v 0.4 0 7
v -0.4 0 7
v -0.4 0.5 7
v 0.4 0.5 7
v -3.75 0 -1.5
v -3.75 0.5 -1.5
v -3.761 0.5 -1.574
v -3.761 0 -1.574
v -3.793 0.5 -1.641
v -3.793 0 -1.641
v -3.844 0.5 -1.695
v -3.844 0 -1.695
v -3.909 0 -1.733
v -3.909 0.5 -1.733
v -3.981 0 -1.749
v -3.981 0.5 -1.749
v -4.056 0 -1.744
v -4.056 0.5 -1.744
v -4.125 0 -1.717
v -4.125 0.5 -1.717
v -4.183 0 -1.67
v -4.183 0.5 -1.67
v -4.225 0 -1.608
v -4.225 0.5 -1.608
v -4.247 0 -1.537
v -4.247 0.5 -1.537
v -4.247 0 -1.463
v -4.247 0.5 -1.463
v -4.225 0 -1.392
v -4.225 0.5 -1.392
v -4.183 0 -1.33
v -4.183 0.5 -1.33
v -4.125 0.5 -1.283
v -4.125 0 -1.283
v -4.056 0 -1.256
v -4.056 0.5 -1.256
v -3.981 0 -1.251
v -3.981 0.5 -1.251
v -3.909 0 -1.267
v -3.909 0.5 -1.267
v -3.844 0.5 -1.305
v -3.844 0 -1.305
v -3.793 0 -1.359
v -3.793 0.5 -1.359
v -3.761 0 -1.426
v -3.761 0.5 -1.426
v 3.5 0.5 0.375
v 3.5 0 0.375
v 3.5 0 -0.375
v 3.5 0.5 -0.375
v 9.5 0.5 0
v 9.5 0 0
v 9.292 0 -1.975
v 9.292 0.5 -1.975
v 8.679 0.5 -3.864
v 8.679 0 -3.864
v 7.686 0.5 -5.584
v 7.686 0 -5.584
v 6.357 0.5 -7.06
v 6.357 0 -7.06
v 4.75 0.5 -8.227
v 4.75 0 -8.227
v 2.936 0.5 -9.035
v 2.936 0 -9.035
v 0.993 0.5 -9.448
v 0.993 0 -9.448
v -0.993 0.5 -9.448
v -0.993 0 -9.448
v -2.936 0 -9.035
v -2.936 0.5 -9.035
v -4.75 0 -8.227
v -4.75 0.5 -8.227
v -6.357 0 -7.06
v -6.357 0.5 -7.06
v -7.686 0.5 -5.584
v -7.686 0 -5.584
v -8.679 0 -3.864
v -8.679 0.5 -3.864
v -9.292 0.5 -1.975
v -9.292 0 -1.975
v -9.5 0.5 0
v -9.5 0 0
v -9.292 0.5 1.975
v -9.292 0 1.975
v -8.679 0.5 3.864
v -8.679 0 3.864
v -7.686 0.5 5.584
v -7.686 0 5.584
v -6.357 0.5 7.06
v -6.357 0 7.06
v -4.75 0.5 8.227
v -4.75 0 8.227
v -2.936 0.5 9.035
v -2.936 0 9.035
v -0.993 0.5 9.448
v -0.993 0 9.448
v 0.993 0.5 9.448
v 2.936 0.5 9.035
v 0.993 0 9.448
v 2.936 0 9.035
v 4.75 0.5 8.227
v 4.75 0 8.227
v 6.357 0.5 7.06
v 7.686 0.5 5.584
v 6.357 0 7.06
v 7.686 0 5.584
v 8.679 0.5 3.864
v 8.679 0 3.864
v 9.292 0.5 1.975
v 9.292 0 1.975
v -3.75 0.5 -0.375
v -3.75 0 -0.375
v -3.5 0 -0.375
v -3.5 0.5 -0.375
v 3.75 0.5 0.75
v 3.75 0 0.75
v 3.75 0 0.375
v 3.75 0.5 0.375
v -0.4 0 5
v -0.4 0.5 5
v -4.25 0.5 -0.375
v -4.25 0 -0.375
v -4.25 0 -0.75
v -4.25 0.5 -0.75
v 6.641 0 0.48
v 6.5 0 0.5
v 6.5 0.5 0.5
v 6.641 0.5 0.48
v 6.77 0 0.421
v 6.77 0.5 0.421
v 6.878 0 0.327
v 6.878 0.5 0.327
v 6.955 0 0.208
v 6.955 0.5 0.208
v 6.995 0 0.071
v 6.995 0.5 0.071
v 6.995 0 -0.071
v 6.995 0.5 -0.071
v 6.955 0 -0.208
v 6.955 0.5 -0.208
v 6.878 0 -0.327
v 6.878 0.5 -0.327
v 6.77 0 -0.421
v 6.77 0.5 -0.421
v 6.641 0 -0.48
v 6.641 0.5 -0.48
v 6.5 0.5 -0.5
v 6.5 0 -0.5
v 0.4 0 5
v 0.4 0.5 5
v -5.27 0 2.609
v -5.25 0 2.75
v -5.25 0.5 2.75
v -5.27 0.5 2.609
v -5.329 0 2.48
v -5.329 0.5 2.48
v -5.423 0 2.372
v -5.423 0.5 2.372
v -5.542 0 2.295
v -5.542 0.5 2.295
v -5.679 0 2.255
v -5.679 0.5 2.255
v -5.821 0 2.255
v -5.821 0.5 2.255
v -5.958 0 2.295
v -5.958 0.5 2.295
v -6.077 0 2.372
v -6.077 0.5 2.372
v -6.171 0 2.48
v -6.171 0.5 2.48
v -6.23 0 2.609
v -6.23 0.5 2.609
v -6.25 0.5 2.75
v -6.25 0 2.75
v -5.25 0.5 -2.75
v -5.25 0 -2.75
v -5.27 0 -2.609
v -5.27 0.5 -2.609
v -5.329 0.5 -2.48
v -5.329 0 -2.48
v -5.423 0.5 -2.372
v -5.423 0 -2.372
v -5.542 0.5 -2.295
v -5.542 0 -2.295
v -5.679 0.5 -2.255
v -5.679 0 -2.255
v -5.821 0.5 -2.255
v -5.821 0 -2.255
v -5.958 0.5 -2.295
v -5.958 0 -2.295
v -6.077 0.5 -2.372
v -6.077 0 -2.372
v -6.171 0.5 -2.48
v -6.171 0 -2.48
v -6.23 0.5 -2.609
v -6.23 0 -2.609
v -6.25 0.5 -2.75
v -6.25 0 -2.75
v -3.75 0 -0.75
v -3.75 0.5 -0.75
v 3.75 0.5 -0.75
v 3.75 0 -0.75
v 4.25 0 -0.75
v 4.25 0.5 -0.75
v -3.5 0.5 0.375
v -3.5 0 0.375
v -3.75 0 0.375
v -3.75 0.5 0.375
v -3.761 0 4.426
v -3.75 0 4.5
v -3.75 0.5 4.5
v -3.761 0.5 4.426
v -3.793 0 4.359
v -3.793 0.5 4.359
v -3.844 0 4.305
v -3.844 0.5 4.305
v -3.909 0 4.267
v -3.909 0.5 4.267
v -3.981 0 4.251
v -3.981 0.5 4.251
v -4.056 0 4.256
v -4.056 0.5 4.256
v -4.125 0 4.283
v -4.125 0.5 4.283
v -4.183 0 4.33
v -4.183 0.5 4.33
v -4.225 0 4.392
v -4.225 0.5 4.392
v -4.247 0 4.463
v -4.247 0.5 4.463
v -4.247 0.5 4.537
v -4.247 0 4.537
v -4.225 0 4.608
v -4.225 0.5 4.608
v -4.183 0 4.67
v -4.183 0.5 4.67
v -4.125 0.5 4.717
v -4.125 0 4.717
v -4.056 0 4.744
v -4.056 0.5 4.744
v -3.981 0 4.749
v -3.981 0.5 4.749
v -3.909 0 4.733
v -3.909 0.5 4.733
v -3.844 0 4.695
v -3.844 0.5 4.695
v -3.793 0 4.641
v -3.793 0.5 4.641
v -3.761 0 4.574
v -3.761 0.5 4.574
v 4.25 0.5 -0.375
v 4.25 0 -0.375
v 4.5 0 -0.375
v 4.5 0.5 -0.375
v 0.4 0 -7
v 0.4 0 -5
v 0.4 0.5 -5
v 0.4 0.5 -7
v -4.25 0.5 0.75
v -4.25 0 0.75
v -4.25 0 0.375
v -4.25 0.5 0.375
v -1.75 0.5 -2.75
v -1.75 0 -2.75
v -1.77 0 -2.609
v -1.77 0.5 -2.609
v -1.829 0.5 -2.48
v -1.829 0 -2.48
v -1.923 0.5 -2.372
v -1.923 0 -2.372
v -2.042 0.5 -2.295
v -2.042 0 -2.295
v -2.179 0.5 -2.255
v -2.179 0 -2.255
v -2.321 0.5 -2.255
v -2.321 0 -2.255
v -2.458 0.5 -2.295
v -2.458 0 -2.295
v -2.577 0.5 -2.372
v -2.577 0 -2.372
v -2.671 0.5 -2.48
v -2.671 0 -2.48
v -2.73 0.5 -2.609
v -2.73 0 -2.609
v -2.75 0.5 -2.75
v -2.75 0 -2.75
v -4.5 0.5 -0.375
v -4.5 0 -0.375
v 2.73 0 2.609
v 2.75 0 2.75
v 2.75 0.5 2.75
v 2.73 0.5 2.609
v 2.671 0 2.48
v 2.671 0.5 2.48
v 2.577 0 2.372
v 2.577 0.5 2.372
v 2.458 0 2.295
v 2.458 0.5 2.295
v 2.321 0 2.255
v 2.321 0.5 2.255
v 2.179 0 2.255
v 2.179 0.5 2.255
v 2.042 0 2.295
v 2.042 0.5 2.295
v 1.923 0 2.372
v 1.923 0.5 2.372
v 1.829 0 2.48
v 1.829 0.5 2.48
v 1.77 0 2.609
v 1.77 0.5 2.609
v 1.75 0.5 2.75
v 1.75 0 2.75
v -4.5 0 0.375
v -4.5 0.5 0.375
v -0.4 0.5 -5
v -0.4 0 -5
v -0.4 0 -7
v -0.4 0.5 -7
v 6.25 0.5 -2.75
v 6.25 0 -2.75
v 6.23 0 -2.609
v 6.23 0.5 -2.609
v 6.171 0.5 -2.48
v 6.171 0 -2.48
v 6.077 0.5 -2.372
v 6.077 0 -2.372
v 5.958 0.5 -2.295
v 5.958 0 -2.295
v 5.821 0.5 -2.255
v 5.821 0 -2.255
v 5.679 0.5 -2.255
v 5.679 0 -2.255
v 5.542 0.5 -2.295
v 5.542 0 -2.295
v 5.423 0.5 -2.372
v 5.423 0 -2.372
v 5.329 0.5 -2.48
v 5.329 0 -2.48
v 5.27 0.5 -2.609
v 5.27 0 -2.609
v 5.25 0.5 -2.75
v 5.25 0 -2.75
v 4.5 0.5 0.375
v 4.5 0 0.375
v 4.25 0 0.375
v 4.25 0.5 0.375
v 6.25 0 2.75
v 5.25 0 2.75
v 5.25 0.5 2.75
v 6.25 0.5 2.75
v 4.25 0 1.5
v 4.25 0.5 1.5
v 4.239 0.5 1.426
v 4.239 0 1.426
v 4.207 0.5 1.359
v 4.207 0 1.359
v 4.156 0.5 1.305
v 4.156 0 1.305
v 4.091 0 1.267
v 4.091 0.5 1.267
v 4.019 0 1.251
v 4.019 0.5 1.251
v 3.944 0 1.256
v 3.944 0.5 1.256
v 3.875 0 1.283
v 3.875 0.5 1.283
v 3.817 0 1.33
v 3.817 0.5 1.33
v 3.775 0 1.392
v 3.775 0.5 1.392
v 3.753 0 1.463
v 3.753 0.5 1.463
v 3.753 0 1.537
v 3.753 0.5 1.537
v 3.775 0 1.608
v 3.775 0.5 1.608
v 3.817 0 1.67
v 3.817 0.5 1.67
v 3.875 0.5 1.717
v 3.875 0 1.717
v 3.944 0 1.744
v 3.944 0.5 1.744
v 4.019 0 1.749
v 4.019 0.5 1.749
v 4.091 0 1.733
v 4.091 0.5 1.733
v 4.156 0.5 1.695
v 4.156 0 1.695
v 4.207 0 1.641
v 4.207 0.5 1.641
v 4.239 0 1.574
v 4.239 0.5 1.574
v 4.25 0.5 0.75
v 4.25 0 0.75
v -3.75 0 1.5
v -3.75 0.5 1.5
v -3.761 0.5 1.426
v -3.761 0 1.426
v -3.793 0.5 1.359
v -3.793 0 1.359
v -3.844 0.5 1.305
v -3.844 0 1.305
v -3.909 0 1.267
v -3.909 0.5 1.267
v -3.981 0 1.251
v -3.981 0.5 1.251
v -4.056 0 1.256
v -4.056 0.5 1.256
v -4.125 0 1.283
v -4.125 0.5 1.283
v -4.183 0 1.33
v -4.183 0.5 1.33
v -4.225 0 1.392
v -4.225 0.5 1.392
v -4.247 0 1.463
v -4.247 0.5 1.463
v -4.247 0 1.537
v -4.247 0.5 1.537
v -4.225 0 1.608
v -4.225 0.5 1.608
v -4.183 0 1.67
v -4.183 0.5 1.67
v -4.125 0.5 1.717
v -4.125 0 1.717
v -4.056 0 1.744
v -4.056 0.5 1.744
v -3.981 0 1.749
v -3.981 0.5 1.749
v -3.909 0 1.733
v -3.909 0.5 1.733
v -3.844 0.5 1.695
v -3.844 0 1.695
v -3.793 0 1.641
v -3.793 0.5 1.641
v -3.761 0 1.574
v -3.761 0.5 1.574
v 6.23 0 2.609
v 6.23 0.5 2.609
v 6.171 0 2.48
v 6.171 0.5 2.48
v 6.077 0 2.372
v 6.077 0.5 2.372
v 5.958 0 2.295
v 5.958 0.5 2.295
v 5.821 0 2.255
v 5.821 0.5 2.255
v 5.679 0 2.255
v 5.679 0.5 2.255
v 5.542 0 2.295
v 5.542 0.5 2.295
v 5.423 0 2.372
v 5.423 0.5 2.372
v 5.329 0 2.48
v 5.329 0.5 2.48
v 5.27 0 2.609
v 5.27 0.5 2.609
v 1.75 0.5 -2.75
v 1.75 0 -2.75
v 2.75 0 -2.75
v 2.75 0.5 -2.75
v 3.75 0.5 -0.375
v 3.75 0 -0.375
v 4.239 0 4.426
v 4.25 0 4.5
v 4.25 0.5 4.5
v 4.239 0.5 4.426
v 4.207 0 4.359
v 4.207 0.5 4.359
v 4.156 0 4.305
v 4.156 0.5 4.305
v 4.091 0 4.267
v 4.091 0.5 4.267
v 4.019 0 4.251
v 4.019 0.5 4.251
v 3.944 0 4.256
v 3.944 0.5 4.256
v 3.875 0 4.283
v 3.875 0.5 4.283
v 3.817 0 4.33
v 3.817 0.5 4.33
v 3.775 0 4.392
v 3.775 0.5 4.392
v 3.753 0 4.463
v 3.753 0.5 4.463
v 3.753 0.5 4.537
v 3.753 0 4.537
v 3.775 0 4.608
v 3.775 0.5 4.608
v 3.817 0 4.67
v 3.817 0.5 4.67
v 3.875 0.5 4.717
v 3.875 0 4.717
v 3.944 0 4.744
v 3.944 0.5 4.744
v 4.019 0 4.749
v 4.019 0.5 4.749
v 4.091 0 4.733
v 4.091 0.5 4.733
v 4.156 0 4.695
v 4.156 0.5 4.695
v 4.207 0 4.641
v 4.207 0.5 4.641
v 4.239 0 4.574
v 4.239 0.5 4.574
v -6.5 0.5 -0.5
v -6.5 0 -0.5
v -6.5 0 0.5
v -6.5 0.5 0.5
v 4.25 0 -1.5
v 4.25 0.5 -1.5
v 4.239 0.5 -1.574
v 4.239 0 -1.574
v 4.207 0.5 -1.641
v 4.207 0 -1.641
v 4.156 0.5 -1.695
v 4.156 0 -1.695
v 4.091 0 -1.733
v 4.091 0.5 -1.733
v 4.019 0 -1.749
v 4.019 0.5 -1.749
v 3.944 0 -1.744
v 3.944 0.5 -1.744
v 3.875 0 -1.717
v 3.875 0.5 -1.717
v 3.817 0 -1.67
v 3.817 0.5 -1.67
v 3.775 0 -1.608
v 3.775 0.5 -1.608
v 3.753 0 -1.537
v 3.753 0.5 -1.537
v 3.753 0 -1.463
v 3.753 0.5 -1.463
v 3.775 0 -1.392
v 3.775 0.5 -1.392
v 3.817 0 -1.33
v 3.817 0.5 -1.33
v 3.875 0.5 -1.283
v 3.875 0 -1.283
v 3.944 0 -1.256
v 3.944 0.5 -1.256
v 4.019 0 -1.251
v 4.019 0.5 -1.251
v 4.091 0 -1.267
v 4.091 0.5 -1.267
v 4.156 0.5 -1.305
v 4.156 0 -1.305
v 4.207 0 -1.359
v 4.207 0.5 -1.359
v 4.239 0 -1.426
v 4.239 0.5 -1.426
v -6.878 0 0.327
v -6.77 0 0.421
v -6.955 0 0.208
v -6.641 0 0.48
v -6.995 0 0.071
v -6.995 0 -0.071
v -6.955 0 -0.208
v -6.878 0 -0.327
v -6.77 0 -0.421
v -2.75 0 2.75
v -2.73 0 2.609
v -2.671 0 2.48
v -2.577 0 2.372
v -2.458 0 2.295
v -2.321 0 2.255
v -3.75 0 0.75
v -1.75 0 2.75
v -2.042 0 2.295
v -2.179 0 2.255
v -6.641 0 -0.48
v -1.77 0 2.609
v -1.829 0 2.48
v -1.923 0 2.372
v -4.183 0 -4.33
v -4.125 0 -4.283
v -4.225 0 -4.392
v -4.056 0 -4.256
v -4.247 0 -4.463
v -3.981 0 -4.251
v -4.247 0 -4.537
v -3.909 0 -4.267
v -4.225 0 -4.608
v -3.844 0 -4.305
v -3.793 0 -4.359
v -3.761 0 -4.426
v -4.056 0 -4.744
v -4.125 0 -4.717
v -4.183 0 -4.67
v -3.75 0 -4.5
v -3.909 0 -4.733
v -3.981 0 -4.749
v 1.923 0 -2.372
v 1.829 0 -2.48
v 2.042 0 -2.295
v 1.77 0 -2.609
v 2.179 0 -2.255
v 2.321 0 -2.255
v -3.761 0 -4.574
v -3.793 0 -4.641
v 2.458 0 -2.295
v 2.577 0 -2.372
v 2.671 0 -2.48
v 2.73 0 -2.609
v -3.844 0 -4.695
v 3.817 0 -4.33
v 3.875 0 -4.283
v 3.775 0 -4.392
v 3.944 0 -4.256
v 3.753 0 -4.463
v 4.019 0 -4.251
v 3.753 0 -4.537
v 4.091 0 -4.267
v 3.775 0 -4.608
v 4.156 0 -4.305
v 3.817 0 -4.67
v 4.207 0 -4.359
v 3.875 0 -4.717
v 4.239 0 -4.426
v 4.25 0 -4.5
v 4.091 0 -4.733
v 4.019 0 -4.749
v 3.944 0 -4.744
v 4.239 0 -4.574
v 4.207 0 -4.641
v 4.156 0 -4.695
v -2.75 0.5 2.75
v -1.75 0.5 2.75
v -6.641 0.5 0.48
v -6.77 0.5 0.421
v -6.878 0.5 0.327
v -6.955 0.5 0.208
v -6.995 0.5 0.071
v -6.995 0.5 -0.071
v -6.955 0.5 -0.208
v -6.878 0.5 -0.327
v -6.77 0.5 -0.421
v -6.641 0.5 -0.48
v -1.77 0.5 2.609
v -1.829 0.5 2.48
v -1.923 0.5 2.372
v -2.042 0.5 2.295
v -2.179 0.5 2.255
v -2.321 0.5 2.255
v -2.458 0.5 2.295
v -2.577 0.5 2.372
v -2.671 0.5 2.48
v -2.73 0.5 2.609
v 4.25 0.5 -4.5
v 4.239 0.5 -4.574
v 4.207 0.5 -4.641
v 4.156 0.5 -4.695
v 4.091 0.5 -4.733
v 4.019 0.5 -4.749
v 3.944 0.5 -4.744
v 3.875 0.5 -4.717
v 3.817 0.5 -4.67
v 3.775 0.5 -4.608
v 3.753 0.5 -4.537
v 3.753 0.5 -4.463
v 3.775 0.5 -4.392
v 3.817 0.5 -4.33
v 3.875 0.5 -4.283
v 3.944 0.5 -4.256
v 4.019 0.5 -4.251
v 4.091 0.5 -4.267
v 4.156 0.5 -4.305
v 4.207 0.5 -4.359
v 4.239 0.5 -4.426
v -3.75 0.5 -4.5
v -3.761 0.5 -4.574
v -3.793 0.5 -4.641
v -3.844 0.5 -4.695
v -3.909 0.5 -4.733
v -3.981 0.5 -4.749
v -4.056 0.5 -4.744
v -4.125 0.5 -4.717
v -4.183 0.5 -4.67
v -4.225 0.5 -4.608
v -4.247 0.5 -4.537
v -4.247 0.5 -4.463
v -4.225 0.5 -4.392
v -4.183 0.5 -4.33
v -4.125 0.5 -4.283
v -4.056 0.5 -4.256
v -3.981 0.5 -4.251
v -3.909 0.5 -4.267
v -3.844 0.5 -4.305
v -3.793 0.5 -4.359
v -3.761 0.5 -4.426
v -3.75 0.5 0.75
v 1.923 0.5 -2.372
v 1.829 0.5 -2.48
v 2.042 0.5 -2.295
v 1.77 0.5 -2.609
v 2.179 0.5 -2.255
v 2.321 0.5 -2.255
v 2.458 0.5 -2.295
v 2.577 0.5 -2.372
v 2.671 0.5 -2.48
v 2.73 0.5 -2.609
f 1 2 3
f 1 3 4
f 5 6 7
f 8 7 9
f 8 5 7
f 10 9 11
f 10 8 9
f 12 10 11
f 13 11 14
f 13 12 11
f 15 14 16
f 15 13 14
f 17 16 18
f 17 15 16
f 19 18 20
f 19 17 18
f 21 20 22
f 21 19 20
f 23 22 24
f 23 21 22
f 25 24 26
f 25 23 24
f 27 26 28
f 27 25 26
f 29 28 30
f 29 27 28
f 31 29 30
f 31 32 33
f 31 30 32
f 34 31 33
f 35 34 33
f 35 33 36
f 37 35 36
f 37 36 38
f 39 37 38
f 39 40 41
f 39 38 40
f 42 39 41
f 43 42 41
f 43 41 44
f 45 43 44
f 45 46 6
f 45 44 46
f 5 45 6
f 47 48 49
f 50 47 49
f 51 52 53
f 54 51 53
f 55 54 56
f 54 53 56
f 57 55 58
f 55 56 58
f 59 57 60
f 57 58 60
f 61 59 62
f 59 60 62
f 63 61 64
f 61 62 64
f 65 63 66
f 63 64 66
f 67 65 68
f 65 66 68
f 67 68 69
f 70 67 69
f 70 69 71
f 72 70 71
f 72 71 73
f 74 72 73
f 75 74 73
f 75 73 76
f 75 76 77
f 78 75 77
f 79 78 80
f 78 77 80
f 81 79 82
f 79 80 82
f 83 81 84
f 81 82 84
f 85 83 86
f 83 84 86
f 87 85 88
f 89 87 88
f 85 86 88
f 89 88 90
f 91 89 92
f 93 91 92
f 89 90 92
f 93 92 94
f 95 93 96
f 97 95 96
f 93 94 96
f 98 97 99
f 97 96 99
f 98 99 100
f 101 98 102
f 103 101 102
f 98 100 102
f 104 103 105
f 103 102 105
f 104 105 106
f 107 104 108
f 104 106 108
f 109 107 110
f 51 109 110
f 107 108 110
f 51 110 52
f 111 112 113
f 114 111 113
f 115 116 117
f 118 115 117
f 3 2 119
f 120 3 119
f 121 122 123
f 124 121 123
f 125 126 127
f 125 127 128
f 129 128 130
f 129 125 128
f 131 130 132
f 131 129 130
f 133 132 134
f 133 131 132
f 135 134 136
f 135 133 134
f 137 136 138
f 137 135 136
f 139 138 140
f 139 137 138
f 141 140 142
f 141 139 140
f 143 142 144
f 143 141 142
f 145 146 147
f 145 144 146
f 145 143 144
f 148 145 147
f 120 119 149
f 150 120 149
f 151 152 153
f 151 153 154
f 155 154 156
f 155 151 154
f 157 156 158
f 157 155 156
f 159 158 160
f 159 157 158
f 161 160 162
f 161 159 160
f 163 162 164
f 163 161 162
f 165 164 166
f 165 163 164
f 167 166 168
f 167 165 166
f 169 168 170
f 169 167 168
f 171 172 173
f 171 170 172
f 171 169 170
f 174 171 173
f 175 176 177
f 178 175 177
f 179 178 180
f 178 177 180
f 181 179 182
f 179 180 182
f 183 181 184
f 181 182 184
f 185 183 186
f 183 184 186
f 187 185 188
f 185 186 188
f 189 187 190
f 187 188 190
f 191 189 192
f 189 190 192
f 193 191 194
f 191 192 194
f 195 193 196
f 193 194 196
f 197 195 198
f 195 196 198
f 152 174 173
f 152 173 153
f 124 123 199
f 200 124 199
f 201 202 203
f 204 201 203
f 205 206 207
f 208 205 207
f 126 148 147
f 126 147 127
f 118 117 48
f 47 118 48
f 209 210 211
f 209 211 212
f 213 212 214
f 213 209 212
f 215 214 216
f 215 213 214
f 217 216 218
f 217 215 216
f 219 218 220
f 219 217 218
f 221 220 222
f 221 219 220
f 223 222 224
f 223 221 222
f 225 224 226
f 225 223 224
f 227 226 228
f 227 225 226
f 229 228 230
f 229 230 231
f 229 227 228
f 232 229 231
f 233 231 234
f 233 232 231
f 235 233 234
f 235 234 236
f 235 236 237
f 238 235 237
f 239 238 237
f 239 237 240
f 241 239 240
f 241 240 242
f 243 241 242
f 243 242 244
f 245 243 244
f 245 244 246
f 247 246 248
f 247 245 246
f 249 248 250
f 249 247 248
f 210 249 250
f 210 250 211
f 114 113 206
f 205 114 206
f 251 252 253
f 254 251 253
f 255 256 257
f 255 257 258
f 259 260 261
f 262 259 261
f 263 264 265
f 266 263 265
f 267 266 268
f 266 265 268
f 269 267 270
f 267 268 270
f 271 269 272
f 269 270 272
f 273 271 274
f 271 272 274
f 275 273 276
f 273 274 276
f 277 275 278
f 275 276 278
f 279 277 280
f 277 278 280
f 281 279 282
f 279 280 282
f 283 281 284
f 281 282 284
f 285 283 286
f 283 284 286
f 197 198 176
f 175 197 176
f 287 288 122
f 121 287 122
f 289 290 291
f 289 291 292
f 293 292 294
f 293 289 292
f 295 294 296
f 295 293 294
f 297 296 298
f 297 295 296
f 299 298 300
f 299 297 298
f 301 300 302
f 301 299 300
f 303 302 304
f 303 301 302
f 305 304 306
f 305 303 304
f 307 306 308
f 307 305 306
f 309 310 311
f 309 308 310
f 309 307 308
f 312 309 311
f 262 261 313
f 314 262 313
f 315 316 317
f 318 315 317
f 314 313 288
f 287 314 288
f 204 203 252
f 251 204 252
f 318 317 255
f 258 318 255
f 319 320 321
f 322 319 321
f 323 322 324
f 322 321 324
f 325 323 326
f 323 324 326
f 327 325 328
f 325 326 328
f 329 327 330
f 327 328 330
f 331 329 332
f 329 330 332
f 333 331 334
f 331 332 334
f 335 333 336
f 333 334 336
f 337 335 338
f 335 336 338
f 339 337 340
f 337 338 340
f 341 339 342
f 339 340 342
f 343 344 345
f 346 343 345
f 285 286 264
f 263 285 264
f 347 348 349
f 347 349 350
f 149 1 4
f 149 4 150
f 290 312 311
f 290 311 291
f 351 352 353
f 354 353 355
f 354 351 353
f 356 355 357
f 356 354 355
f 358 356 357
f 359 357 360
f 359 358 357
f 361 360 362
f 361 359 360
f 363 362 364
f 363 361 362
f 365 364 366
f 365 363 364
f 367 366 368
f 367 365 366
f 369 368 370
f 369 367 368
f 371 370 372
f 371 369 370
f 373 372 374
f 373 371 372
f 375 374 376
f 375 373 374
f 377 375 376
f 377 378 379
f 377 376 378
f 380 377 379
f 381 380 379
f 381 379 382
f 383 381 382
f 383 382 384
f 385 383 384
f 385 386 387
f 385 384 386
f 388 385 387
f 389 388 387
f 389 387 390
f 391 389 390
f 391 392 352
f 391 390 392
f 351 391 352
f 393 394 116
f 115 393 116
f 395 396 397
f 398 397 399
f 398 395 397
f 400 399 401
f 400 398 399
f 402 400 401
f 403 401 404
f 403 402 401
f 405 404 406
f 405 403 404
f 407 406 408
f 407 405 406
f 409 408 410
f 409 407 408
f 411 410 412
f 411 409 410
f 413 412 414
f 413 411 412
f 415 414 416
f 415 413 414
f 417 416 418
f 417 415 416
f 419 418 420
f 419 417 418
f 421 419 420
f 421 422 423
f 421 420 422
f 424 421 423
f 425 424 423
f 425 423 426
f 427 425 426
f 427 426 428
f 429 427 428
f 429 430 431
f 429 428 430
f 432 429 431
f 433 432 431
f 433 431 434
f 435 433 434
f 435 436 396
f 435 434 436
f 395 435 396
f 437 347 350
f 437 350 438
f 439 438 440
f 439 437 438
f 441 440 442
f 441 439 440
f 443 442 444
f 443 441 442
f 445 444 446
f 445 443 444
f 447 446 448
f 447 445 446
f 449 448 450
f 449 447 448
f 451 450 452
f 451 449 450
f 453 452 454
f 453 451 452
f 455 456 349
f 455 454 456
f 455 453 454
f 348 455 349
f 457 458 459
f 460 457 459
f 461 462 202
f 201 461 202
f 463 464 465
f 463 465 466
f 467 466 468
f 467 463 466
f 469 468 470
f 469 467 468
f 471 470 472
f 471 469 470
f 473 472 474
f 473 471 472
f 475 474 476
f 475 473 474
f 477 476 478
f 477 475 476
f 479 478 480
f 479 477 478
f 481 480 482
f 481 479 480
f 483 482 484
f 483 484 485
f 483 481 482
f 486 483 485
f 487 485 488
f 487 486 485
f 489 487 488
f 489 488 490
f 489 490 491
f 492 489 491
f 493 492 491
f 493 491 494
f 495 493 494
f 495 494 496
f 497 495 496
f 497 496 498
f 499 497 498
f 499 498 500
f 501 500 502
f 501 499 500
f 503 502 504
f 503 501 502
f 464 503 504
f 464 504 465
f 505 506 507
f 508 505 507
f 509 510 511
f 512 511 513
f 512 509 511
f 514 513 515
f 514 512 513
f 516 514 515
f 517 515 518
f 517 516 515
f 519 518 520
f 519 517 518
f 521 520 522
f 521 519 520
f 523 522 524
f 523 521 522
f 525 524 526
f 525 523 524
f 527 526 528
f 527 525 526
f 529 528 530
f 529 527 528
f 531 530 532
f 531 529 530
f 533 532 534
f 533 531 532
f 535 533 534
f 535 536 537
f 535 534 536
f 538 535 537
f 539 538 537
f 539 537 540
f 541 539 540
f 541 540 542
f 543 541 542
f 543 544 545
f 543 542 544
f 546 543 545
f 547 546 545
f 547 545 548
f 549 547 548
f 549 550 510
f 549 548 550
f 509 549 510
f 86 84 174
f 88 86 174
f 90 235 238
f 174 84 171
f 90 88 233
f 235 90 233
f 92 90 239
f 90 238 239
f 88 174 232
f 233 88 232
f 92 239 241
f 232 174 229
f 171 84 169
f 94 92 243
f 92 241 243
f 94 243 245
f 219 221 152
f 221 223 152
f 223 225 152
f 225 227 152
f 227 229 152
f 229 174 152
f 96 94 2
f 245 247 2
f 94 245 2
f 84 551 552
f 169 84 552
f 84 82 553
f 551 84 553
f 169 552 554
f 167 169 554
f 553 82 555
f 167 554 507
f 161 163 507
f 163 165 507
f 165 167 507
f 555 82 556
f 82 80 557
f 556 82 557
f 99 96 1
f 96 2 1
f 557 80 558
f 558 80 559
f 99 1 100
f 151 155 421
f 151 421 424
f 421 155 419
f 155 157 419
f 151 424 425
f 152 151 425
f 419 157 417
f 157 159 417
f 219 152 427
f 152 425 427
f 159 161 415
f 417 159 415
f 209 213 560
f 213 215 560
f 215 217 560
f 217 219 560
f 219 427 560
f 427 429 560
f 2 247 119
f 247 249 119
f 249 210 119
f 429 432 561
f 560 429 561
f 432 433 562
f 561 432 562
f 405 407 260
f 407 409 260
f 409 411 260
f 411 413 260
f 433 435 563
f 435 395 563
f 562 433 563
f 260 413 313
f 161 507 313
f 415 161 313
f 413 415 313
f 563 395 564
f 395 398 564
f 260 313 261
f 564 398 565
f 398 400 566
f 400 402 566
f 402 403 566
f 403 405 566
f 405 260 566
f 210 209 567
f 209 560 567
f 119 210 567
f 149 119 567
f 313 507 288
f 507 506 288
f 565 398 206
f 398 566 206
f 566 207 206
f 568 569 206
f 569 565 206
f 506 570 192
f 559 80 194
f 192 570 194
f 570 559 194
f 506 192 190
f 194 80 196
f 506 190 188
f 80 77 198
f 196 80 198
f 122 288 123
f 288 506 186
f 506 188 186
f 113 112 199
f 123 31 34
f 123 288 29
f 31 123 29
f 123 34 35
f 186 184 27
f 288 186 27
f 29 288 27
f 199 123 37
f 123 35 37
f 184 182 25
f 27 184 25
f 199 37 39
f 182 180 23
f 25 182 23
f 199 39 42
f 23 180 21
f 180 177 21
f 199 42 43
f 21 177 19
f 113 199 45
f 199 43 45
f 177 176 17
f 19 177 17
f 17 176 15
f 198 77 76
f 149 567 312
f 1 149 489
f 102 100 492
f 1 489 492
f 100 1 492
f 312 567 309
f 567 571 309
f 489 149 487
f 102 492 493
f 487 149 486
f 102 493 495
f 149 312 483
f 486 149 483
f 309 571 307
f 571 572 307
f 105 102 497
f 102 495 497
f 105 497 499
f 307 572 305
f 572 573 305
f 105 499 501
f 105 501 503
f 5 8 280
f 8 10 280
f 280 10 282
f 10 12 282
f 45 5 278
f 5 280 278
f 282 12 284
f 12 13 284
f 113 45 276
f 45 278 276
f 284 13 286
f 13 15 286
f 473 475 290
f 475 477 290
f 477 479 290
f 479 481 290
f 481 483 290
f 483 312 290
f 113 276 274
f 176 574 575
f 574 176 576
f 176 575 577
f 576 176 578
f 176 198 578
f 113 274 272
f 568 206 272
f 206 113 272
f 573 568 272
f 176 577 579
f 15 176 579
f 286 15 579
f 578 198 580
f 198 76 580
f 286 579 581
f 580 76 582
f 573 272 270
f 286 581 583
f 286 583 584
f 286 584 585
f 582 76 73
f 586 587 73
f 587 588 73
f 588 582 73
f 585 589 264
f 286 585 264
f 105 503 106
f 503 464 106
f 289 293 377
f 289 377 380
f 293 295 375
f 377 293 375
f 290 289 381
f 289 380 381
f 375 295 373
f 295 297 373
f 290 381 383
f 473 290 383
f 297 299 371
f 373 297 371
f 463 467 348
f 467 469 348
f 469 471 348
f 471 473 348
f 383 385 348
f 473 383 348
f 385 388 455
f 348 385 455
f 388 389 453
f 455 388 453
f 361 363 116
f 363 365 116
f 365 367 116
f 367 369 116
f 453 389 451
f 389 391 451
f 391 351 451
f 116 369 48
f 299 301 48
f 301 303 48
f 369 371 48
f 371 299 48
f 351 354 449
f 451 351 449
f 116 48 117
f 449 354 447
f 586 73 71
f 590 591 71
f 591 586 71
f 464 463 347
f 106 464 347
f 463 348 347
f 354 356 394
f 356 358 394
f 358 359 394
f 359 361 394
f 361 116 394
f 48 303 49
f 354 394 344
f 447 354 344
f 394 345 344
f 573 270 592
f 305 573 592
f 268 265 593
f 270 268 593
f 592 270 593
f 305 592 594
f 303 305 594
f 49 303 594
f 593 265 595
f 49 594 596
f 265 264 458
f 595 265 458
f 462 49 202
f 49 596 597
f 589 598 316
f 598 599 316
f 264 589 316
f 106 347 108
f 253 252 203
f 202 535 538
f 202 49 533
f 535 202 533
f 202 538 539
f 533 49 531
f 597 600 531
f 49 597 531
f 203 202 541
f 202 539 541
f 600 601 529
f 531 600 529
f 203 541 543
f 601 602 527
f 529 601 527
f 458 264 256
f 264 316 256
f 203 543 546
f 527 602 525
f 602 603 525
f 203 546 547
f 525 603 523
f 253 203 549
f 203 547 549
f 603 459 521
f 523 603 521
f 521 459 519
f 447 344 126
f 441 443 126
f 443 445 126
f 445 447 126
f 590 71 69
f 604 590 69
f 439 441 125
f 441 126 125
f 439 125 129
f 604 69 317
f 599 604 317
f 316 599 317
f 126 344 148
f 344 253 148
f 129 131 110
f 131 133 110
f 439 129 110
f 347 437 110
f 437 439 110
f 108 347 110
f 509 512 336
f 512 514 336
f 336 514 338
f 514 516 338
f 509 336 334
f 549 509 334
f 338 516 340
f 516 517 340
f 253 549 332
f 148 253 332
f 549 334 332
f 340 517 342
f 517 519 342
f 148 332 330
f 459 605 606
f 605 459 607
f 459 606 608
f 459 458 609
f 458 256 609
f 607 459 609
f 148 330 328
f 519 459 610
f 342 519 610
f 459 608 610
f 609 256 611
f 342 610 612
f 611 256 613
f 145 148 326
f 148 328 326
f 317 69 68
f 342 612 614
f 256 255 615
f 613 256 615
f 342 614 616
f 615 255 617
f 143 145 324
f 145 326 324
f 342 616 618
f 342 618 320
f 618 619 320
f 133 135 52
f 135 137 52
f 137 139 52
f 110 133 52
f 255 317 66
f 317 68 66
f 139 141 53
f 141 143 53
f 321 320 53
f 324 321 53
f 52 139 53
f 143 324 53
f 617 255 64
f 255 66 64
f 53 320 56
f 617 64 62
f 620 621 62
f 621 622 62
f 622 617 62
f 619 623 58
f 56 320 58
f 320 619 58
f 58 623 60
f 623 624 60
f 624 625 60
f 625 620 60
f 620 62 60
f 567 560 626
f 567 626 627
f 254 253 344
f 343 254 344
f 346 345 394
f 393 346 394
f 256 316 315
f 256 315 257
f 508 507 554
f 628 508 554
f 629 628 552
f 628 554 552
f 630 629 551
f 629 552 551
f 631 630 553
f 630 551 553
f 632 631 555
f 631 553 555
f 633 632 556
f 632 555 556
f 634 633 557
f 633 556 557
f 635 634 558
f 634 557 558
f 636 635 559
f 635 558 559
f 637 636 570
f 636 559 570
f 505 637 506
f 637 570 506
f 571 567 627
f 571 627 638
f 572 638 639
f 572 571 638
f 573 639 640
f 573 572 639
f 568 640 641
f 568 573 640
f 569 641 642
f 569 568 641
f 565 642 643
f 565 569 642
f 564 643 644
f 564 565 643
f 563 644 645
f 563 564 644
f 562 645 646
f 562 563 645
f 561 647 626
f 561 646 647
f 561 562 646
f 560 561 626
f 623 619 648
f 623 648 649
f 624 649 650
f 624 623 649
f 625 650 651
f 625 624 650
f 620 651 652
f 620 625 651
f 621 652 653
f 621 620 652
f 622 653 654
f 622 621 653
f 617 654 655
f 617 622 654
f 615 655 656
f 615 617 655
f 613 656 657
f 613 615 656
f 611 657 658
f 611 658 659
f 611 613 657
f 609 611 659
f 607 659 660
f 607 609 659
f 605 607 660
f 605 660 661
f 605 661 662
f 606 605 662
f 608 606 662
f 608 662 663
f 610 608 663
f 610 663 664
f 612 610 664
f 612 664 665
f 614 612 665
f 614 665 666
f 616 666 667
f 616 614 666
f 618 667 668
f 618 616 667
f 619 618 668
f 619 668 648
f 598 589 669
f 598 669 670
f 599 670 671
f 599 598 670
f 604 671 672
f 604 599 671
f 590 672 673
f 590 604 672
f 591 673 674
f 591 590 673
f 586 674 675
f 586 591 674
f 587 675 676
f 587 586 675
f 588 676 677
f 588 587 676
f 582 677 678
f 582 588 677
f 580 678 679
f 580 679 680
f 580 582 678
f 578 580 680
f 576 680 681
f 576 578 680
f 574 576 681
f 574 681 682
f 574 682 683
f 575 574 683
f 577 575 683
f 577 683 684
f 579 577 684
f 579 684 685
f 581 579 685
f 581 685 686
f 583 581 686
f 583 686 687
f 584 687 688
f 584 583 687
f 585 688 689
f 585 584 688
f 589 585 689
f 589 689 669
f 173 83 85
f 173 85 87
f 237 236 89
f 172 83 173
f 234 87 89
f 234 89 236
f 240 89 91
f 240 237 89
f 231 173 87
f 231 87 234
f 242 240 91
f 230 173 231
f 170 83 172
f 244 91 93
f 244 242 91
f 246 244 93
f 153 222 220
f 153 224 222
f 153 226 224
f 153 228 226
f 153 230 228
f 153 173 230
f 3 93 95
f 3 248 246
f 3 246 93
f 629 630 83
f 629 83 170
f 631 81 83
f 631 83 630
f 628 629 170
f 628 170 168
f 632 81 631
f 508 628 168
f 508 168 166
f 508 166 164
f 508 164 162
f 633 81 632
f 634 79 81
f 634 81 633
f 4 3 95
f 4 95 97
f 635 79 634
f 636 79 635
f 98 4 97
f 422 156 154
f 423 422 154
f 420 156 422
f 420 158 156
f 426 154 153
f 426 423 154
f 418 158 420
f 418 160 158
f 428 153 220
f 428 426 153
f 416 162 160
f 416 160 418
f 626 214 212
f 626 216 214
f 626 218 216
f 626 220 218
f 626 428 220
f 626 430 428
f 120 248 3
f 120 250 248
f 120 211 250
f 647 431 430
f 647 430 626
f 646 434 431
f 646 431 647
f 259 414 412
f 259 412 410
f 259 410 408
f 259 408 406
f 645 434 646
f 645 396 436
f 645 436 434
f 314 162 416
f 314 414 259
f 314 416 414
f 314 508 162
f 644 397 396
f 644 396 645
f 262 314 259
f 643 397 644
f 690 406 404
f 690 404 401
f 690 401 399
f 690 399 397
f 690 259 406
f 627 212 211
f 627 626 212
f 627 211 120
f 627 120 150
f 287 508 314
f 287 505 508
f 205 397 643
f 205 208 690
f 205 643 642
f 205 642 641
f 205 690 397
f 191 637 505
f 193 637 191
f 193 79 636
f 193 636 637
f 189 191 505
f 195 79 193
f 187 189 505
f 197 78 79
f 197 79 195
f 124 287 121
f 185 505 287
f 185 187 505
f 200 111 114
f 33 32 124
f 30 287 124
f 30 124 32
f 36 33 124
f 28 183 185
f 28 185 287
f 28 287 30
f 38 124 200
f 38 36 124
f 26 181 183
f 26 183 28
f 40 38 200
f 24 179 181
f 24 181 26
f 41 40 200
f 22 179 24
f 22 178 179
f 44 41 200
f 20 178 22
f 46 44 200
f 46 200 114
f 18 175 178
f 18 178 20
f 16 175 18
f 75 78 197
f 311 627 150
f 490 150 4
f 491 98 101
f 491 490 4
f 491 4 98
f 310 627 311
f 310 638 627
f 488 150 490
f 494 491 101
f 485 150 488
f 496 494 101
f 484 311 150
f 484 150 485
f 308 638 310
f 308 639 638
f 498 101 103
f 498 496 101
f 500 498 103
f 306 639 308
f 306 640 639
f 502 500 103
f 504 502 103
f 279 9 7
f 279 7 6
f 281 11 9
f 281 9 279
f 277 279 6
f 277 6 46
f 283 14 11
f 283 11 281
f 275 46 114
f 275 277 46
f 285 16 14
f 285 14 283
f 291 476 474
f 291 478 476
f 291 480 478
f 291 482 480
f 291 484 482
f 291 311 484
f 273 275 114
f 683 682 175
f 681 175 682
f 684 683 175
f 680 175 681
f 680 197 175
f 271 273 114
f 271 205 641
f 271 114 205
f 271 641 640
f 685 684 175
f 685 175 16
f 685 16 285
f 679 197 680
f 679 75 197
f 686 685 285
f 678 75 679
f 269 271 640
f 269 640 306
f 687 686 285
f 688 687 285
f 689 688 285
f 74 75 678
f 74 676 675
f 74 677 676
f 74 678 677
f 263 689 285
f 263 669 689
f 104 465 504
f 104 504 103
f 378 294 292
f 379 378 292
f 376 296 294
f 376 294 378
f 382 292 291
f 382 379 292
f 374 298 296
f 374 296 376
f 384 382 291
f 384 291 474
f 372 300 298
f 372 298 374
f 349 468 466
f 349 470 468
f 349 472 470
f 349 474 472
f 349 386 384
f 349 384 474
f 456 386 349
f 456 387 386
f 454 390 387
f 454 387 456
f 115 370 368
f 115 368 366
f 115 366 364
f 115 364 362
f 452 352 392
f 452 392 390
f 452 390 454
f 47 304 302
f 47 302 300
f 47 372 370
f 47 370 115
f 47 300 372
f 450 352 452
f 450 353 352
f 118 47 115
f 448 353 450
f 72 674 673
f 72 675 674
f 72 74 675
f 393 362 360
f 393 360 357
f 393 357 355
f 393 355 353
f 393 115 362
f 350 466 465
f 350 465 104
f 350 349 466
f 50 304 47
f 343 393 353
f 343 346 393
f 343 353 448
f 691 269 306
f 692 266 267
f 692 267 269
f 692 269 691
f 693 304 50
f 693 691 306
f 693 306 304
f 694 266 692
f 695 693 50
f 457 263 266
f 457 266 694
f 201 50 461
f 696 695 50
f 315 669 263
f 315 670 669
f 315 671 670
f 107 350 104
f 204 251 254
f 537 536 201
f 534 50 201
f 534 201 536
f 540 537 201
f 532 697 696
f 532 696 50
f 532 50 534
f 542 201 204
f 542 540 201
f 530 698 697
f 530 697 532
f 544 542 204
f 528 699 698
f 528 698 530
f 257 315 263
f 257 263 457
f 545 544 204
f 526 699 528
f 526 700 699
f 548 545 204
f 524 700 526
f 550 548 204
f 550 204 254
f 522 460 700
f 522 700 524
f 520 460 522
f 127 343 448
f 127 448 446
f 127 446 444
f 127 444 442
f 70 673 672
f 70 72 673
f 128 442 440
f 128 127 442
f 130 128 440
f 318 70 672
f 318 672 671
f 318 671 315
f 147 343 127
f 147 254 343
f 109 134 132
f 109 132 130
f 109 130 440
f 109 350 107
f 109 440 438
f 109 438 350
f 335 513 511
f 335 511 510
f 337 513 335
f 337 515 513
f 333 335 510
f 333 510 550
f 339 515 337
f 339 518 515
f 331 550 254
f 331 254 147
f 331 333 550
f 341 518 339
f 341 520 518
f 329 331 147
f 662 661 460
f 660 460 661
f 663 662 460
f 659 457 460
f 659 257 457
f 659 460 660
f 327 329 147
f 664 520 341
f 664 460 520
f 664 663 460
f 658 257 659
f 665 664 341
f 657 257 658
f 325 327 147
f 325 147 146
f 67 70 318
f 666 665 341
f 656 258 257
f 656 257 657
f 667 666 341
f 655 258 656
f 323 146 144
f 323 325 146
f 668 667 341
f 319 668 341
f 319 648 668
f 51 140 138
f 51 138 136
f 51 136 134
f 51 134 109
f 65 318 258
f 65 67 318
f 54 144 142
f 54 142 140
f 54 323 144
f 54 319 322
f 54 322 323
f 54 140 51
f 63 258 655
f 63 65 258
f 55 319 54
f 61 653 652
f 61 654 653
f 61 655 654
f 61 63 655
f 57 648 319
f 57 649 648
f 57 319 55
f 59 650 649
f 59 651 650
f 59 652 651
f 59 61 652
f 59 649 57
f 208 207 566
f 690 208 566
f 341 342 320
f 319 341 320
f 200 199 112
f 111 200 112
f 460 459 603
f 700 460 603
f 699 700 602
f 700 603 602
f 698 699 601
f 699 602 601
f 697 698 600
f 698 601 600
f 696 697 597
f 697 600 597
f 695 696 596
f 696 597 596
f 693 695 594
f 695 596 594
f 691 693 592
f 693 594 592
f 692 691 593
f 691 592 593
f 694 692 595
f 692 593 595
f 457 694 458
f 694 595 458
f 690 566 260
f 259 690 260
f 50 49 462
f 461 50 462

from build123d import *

# Parameters (mm, degrees)
SKETCH1_R      = 9.5
SKETCH1_R_2    = 0.25
SKETCH1_W      = 0.8
SKETCH1_H      = 2
EXTRUDE1_DEPTH = 0.5
SKETCH2_R      = 0.25
EXTRUDE2_DEPTH = 1.5


with BuildPart() as part:
    # Sketch1 → Extrude1 (new body)
    with BuildSketch(Plane(origin=(0, 0, 0), x_dir=(1, 0, 0), z_dir=(0, 1, 0))):
        Circle(SKETCH1_R)
        with Locations((-4, 4.5)):
            Circle(SKETCH1_R_2, mode=Mode.SUBTRACT)
        with Locations((4, 4.5)):
            Circle(SKETCH1_R_2, mode=Mode.SUBTRACT)
        with Locations((4, -4.5)):
            Circle(SKETCH1_R_2, mode=Mode.SUBTRACT)
        with Locations((-4, -4.5)):
            Circle(SKETCH1_R_2, mode=Mode.SUBTRACT)
        with Locations((0, 6)):
            Rectangle(SKETCH1_W, SKETCH1_H, mode=Mode.SUBTRACT)
        with Locations((0, -6)):
            Rectangle(SKETCH1_W, SKETCH1_H, mode=Mode.SUBTRACT)
    extrude(amount=EXTRUDE1_DEPTH)

    # Sketch2 → Extrude2 (cut, through all)
    with BuildSketch(Plane(origin=(0, 0, 0), x_dir=(1, 0, 0), z_dir=(0, 1, 0))):
        with Locations((4, 1.5)):
            Circle(SKETCH2_R)
        with Locations((4, -1.5)):
            Circle(SKETCH2_R)
        with Locations((-4, 1.5)):
            Circle(SKETCH2_R)
        with Locations((-4, -1.5)):
            Circle(SKETCH2_R)
        Polygon((3.75, 0.75), (4.25, 0.75), (4.25, 0.375), (4.5, 0.375), (4.5, -0.375), (4.25, -0.375), (4.25, -0.75), (3.75, -0.75), (3.75, -0.375), (3.5, -0.375), (3.5, 0.375), (3.75, 0.375), align=None)
        Polygon((-3.5, 0.375), (-3.5, -0.375), (-3.75, -0.375), (-3.75, -0.75), (-4.25, -0.75), (-4.25, -0.375), (-4.5, -0.375), (-4.5, 0.375), (-4.25, 0.375), (-4.25, 0.75), (-3.75, 0.75), (-3.75, 0.375), align=None)
        with BuildLine():
            Line((-6.5, 0.5), (-6.5, -0.5))
            ThreePointArc((-6.5, -0.5), (-7, 0), (-6.5, 0.5))
        make_face()
        with BuildLine():
            Line((6.5, 0.5), (6.5, -0.5))
            ThreePointArc((6.5, -0.5), (7, 0), (6.5, 0.5))
        make_face()
        with BuildLine():
            Line((-6.25, 2.75), (-5.25, 2.75))
            ThreePointArc((-5.25, 2.75), (-5.75, 2.25), (-6.25, 2.75))
        make_face()
        with BuildLine():
            Line((-2.75, 2.75), (-1.75, 2.75))
            ThreePointArc((-1.75, 2.75), (-2.25, 2.25), (-2.75, 2.75))
        make_face()
        with BuildLine():
            Line((1.75, 2.75), (2.75, 2.75))
            ThreePointArc((2.75, 2.75), (2.25, 2.25), (1.75, 2.75))
        make_face()
        with BuildLine():
            Line((5.25, 2.75), (6.25, 2.75))
            ThreePointArc((6.25, 2.75), (5.75, 2.25), (5.25, 2.75))
        make_face()
        with BuildLine():
            Line((-6.25, -2.75), (-5.25, -2.75))
            ThreePointArc((-5.25, -2.75), (-5.75, -2.25), (-6.25, -2.75))
        make_face()
        with BuildLine():
            Line((-2.75, -2.75), (-1.75, -2.75))
            ThreePointArc((-1.75, -2.75), (-2.25, -2.25), (-2.75, -2.75))
        make_face()
        with BuildLine():
            Line((1.75, -2.75), (2.75, -2.75))
            ThreePointArc((2.75, -2.75), (2.25, -2.25), (1.75, -2.75))
        make_face()
        with BuildLine():
            Line((5.25, -2.75), (6.25, -2.75))
            ThreePointArc((6.25, -2.75), (5.75, -2.25), (5.25, -2.75))
        make_face()
    extrude(amount=EXTRUDE2_DEPTH, mode=Mode.SUBTRACT)


solid = part.part
